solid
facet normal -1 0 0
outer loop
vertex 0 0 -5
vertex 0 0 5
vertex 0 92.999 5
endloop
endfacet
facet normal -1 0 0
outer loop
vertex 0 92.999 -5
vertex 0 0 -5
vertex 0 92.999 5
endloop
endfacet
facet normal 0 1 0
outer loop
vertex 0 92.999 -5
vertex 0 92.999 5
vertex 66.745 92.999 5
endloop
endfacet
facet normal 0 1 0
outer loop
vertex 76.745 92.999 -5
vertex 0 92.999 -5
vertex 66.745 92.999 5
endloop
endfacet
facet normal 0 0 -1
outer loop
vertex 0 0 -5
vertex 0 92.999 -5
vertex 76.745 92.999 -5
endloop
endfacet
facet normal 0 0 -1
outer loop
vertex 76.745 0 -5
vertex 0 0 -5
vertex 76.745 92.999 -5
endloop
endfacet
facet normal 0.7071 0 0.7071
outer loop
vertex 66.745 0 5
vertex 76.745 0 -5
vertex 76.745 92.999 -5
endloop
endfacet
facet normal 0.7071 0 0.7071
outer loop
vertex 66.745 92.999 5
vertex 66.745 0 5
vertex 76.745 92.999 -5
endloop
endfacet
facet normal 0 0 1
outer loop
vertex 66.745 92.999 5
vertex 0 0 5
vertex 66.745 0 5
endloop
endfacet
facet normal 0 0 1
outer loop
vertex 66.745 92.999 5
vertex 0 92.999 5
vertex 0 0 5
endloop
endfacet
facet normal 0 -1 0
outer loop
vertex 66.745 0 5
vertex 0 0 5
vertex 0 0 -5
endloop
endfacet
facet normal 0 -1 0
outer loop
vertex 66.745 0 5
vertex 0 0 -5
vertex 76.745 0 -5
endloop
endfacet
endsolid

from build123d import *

# Parameters (mm, degrees)
F0_W     = 76.7452418804
F0_H     = 92.9985865951
F1_DEPTH = 5
F3_SIZE  = 9.99999


# Not quite as in the source:
# - a fillet or chamfer is up to 0.001 mm smaller than in the source, because OpenCascade refuses the exact size


with BuildPart() as f1:
    # F0 (on Top) → F1 (new body, symmetric)
    with BuildSketch(Plane.XY):
        with Locations((38.3726209402, 46.4992932975)):
            Rectangle(F0_W, F0_H)
    extrude(amount=F1_DEPTH, both=True)

    # F3 (size 10 in the source; OpenCascade refuses exactly that, so slightly less here)
    f3_edges = [f1.edges().sort_by_distance(p)[0] for p in [
        (76.745242, 46.499293, 5),
    ]]
    chamfer(f3_edges, length=F3_SIZE)


solid = f1.part
